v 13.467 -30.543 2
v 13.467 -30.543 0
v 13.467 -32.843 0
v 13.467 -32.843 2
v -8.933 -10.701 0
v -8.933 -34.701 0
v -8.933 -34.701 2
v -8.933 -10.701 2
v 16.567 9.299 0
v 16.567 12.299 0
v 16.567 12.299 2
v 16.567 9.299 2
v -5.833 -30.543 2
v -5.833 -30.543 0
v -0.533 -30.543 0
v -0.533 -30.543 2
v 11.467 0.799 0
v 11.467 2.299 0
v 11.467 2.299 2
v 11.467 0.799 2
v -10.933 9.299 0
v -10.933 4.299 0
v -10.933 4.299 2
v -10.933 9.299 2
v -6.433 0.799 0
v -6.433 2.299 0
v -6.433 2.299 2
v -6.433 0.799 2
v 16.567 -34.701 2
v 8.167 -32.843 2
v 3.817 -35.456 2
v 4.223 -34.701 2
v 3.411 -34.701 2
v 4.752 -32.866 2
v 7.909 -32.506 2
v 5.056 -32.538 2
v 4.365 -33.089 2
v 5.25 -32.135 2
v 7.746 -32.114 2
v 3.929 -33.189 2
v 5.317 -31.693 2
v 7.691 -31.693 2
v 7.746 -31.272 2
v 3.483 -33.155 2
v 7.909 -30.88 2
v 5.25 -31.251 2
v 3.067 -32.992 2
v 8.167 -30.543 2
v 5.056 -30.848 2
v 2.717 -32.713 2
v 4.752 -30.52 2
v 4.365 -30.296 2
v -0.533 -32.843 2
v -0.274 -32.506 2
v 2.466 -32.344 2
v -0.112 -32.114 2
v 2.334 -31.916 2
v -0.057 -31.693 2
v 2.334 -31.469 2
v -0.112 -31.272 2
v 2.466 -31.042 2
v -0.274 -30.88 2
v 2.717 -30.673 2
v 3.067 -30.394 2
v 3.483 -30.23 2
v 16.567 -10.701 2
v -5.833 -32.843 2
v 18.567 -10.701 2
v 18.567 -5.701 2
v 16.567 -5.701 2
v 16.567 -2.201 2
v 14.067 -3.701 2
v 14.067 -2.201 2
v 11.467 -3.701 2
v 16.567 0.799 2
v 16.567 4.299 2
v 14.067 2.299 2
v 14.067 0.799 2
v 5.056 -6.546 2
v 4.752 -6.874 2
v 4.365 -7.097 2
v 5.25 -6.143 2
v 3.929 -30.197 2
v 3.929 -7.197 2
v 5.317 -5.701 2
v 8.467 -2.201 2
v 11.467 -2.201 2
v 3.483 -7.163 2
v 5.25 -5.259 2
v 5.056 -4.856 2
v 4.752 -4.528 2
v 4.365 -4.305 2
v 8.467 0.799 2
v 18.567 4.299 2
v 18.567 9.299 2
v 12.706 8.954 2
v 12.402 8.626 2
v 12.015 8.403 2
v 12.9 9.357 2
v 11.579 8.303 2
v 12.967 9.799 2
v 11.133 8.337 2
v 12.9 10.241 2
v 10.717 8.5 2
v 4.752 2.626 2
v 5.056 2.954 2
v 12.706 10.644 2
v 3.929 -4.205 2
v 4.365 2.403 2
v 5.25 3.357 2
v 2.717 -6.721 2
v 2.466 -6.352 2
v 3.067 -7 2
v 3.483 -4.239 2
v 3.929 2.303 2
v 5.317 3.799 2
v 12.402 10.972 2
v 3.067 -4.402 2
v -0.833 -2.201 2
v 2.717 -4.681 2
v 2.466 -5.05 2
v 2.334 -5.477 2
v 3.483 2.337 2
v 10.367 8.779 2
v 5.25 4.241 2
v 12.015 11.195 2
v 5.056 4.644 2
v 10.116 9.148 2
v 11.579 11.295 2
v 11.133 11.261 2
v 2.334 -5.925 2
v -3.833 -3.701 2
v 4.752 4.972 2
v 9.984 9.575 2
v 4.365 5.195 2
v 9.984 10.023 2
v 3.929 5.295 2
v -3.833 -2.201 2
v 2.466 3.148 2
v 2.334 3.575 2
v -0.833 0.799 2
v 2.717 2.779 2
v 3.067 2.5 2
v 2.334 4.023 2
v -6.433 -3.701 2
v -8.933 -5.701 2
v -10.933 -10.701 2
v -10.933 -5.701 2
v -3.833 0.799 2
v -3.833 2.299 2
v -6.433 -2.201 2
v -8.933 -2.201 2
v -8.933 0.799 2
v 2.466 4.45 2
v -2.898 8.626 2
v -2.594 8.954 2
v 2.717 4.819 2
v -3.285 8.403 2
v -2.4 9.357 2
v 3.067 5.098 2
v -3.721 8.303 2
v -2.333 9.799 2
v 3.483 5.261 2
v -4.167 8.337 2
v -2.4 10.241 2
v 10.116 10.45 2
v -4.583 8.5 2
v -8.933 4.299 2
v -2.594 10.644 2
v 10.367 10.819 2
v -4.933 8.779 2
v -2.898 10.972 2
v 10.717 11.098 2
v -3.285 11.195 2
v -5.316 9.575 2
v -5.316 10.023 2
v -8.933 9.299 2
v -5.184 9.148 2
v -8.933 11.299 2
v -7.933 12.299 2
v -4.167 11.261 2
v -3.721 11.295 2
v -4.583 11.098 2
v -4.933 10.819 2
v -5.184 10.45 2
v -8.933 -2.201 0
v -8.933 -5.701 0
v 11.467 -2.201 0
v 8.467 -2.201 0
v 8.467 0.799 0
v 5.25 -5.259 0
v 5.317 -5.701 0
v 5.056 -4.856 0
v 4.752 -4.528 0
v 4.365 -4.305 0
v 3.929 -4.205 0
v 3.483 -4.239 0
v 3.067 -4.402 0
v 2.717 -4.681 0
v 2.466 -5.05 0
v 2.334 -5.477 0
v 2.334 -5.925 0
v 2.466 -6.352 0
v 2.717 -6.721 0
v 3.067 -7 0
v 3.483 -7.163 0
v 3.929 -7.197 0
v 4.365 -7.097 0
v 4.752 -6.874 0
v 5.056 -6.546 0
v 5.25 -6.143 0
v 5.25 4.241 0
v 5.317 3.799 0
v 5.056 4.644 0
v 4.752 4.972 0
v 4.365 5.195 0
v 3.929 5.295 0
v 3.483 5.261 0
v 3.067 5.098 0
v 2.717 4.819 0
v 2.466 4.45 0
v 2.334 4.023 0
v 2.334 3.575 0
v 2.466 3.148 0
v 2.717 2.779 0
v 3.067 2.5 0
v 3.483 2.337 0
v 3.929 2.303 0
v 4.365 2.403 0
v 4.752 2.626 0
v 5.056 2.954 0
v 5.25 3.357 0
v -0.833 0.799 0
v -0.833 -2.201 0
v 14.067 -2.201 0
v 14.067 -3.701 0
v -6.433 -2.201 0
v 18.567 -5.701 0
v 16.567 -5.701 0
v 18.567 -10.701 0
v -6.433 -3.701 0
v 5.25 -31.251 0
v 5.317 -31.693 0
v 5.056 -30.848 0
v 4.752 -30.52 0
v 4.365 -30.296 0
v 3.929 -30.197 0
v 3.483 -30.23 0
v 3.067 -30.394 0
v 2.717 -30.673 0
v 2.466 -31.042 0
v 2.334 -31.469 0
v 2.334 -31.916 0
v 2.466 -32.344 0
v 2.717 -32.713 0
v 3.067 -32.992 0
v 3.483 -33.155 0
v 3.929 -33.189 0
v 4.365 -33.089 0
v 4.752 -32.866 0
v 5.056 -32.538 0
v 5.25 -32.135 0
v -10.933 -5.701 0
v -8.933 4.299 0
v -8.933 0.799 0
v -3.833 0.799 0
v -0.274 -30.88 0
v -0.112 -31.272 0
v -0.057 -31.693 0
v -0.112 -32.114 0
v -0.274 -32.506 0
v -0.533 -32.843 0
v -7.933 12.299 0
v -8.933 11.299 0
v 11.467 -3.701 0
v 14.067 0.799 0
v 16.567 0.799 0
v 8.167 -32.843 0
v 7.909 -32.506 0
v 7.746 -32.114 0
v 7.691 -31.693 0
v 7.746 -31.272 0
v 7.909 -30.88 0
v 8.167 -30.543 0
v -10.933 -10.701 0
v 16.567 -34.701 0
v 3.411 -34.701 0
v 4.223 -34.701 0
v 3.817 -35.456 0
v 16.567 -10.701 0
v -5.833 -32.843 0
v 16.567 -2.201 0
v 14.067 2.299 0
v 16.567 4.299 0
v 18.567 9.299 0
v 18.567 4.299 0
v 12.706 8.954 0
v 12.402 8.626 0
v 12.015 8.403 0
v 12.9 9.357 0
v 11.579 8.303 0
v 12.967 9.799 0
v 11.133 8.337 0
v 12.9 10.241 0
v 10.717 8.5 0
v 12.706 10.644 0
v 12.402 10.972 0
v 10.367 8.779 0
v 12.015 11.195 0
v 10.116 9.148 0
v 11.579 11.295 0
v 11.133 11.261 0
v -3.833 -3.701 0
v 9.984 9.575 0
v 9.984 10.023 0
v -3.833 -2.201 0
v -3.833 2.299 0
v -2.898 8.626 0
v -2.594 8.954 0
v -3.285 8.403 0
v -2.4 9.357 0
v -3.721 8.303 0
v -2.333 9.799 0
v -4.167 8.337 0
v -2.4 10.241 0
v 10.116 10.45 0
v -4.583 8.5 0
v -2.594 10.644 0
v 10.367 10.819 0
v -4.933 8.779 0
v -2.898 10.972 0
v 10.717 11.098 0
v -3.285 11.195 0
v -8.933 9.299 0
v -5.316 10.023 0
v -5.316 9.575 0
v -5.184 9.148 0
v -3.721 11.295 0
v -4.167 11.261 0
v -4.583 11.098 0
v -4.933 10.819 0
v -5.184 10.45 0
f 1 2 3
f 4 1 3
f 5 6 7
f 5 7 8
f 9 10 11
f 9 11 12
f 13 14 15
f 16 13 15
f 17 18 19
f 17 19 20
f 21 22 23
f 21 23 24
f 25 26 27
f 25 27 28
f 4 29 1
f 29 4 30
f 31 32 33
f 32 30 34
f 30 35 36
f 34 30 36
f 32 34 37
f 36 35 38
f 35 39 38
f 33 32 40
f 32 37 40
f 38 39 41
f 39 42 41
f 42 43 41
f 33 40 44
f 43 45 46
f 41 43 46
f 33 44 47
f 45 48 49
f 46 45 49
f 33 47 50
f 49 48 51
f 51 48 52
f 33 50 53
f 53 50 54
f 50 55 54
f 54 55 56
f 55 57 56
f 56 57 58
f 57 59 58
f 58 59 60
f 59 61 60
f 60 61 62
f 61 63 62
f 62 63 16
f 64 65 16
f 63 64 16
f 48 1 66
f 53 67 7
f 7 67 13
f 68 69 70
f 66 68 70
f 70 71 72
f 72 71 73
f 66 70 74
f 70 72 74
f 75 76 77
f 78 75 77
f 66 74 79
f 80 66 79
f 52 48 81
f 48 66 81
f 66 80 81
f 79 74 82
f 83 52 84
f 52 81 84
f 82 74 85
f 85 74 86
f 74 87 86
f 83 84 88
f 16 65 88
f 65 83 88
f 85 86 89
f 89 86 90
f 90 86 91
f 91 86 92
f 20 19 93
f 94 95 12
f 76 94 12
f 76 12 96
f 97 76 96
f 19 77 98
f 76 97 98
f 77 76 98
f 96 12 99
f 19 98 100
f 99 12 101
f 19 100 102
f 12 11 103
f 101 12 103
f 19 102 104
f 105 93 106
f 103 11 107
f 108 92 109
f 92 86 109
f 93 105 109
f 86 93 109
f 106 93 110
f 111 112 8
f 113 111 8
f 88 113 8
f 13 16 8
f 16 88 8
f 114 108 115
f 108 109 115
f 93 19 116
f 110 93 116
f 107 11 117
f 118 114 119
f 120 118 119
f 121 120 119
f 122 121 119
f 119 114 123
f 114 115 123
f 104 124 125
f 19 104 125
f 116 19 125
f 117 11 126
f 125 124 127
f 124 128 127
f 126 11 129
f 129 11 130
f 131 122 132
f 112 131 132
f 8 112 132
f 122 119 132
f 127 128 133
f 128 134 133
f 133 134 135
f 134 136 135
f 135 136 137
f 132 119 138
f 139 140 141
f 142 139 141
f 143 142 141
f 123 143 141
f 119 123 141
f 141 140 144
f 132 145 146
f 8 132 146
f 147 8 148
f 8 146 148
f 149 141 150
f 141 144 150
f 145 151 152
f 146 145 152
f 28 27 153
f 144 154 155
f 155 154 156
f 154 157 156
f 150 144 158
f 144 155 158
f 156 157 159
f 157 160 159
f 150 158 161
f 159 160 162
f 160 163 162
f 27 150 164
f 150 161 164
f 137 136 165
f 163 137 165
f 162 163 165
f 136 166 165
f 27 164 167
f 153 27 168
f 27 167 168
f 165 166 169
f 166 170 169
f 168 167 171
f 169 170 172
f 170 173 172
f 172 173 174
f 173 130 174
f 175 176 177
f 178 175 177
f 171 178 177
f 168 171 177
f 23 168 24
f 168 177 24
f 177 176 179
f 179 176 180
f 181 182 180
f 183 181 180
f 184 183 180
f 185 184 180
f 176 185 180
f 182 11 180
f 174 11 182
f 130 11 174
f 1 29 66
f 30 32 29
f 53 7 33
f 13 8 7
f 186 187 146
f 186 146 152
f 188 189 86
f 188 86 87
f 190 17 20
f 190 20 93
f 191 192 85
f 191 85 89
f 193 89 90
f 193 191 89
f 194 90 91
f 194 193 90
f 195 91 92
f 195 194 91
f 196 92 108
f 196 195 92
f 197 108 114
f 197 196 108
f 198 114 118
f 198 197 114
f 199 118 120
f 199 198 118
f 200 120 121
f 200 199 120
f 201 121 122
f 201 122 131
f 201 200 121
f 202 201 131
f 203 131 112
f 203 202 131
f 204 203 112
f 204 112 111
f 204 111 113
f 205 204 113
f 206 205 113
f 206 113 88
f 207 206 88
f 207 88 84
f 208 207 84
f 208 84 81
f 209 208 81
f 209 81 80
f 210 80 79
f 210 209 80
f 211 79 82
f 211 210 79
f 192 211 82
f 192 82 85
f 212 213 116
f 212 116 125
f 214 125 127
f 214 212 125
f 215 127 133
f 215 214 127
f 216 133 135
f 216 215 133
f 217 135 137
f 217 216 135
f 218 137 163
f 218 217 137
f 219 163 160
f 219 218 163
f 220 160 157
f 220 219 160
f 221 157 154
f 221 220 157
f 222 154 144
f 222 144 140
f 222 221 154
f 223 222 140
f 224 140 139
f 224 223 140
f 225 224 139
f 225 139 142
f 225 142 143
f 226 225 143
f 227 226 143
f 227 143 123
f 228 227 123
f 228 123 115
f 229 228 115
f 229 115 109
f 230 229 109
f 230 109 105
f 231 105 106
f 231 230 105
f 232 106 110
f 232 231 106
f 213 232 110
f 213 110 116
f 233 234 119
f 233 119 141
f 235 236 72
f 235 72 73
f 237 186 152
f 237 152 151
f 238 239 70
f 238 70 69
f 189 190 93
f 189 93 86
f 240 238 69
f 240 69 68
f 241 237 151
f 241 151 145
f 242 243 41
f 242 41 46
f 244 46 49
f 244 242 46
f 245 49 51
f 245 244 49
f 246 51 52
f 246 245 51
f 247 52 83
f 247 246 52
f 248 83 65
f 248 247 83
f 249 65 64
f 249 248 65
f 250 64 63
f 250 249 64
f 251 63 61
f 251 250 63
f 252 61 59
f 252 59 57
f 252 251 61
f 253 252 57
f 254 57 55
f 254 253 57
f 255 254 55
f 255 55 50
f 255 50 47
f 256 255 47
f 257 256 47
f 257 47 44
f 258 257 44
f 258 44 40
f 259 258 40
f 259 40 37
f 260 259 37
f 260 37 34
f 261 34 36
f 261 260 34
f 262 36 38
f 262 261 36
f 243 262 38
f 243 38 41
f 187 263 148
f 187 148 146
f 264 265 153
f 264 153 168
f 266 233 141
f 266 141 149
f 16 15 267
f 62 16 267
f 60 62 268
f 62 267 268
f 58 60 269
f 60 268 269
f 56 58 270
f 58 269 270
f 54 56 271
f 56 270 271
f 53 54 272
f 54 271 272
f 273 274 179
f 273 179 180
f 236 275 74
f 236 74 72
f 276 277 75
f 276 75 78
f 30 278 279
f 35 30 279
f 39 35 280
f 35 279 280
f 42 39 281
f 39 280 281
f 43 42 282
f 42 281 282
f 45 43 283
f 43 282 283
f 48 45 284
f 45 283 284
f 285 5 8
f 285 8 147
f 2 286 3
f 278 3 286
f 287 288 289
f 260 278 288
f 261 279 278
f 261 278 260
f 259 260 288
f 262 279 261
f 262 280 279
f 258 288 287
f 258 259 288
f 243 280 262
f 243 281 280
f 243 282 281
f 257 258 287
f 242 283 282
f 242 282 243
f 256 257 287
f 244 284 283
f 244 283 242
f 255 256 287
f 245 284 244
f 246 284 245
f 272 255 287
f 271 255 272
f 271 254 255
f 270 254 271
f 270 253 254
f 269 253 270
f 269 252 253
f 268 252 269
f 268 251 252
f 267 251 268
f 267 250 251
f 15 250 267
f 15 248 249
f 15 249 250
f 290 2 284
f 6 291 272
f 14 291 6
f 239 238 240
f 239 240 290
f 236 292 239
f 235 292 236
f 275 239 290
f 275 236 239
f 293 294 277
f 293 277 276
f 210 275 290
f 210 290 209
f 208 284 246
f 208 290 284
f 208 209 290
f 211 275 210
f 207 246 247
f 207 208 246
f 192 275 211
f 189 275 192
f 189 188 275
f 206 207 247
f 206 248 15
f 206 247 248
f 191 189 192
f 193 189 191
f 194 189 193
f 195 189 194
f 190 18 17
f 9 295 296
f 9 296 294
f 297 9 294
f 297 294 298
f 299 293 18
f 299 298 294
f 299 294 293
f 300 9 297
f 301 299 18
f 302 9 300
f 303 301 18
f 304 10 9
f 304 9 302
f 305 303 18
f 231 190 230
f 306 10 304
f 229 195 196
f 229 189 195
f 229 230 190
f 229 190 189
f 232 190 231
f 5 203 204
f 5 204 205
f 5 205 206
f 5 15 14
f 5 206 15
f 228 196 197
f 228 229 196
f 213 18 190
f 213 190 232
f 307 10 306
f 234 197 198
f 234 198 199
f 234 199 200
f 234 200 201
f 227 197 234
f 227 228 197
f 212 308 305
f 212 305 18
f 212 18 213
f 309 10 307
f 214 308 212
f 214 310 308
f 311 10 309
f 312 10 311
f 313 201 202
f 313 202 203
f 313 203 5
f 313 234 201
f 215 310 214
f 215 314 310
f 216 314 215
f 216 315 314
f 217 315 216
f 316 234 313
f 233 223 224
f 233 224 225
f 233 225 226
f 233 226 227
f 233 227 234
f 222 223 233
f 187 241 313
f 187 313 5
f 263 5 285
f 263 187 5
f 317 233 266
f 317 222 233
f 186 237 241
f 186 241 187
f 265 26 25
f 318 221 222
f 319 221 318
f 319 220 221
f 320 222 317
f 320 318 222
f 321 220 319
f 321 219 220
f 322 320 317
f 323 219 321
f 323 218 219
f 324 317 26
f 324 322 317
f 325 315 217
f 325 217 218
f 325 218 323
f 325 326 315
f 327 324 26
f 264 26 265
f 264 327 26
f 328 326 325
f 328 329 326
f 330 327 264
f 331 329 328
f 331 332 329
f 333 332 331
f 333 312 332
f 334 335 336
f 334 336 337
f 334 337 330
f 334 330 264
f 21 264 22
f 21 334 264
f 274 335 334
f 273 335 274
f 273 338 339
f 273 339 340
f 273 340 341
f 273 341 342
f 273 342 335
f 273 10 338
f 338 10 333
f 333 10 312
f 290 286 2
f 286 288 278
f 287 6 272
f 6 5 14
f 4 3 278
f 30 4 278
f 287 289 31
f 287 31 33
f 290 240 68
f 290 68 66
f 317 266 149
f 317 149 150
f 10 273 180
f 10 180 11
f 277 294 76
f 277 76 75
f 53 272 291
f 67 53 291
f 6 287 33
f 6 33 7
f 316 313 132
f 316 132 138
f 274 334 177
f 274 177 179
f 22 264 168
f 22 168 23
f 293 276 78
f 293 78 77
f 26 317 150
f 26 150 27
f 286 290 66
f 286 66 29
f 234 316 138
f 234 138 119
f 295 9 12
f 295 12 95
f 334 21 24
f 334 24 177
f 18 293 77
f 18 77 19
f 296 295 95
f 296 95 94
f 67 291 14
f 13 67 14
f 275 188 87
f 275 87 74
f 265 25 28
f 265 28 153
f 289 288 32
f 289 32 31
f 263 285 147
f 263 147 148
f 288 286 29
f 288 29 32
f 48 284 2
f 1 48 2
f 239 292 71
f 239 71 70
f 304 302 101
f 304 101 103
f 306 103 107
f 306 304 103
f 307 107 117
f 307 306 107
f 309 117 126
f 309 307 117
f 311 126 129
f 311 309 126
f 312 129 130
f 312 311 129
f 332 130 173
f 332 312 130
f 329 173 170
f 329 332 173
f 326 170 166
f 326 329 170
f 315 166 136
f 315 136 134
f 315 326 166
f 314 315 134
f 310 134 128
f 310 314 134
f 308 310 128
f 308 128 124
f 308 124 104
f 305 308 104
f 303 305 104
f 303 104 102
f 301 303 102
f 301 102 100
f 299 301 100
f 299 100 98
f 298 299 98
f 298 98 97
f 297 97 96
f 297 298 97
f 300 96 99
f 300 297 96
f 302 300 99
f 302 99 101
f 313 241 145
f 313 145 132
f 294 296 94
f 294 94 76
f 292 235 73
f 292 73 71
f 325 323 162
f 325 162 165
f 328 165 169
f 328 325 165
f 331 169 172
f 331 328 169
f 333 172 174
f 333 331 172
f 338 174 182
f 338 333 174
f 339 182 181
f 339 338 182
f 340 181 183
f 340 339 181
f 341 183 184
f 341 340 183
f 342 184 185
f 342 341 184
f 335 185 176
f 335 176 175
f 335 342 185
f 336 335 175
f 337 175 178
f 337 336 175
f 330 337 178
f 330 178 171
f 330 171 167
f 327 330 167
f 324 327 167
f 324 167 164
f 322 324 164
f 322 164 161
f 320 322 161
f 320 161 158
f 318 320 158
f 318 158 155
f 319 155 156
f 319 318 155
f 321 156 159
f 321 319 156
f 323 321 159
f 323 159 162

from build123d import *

# Parameters (mm, degrees)
SKETCH_1_R      = 1.5
EXTRUDE_1_DEPTH = 2


with BuildPart() as part:
    # 草图1 → 凸台-拉伸1 (new body)
    with BuildSketch(Plane.XY):
        Polygon((-8.932938962, -10.700971973), (-10.932938962, -10.700971973), (-10.932938962, -5.700971973), (-8.932938962, -5.700971973), (-8.932938962, -2.200971973), (-6.432938962, -2.200971973), (-6.432938962, -3.700971973), (-3.832938962, -3.700971973), (-3.832938962, -2.200971973), (-0.832938962, -2.200971973), (-0.832938962, 0.799028027), (-3.832938962, 0.799028027), (-3.832938962, 2.299028027), (-6.432938962, 2.299028027), (-6.432938962, 0.799028027), (-8.932938962, 0.799028027), (-8.932938962, 4.299028027), (-10.932938962, 4.299028027), (-10.932938962, 9.299028027), (-8.932938962, 9.299028027), (-8.932938962, 11.299028027), (-7.932938962, 12.299028027), (16.567061038, 12.299028027), (16.567061038, 9.299028027), (18.567061038, 9.299028027), (18.567061038, 4.299028027), (16.567061038, 4.299028027), (16.567061038, 0.799028027), (14.067061038, 0.799028027), (14.067061038, 2.299028027), (11.467061038, 2.299028027), (11.467061038, 0.799028027), (8.467061038, 0.799028027), (8.467061038, -2.200971973), (11.467061038, -2.200971973), (11.467061038, -3.700971973), (14.067061038, -3.700971973), (14.067061038, -2.200971973), (16.567061038, -2.200971973), (16.567061038, -5.700971973), (18.567061038, -5.700971973), (18.567061038, -10.700971973), (16.567061038, -10.700971973), (16.567061038, -34.700971973), (4.222987954, -34.700971973), (3.817061038, -35.455763704), (3.411134121, -34.700971973), (-8.932938962, -34.700971973), align=None)
        with Locations((3.817061038, -5.700971973)):
            Circle(SKETCH_1_R, mode=Mode.SUBTRACT)
        with Locations((3.817061038, 3.799028027)):
            Circle(SKETCH_1_R, mode=Mode.SUBTRACT)
        with Locations((3.817061038, -31.692801434)):
            Circle(SKETCH_1_R, mode=Mode.SUBTRACT)
        with Locations((-3.832938962, 9.799028027)):
            Circle(SKETCH_1_R, mode=Mode.SUBTRACT)
        with Locations((11.467061038, 9.799028027)):
            Circle(SKETCH_1_R, mode=Mode.SUBTRACT)
        with BuildLine():
            Line((13.467061038, -32.842801434), (8.167061038, -32.842801434))
            ThreePointArc((8.167061038, -32.842801434), (7.690715441, -31.692801434), (8.167061038, -30.542801434))
            Line((8.167061038, -30.542801434), (13.467061038, -30.542801434))
            Line((13.467061038, -30.542801434), (13.467061038, -32.842801434))
        make_face(mode=Mode.SUBTRACT)
        with BuildLine():
            Line((-5.832938962, -30.542801434), (-0.532938962, -30.542801434))
            ThreePointArc((-0.532938962, -30.542801434), (-0.056593366, -31.692801434), (-0.532938962, -32.842801434))
            Line((-0.532938962, -32.842801434), (-5.832938962, -32.842801434))
            Line((-5.832938962, -32.842801434), (-5.832938962, -30.542801434))
        make_face(mode=Mode.SUBTRACT)
    extrude(amount=EXTRUDE_1_DEPTH)


solid = part.part
